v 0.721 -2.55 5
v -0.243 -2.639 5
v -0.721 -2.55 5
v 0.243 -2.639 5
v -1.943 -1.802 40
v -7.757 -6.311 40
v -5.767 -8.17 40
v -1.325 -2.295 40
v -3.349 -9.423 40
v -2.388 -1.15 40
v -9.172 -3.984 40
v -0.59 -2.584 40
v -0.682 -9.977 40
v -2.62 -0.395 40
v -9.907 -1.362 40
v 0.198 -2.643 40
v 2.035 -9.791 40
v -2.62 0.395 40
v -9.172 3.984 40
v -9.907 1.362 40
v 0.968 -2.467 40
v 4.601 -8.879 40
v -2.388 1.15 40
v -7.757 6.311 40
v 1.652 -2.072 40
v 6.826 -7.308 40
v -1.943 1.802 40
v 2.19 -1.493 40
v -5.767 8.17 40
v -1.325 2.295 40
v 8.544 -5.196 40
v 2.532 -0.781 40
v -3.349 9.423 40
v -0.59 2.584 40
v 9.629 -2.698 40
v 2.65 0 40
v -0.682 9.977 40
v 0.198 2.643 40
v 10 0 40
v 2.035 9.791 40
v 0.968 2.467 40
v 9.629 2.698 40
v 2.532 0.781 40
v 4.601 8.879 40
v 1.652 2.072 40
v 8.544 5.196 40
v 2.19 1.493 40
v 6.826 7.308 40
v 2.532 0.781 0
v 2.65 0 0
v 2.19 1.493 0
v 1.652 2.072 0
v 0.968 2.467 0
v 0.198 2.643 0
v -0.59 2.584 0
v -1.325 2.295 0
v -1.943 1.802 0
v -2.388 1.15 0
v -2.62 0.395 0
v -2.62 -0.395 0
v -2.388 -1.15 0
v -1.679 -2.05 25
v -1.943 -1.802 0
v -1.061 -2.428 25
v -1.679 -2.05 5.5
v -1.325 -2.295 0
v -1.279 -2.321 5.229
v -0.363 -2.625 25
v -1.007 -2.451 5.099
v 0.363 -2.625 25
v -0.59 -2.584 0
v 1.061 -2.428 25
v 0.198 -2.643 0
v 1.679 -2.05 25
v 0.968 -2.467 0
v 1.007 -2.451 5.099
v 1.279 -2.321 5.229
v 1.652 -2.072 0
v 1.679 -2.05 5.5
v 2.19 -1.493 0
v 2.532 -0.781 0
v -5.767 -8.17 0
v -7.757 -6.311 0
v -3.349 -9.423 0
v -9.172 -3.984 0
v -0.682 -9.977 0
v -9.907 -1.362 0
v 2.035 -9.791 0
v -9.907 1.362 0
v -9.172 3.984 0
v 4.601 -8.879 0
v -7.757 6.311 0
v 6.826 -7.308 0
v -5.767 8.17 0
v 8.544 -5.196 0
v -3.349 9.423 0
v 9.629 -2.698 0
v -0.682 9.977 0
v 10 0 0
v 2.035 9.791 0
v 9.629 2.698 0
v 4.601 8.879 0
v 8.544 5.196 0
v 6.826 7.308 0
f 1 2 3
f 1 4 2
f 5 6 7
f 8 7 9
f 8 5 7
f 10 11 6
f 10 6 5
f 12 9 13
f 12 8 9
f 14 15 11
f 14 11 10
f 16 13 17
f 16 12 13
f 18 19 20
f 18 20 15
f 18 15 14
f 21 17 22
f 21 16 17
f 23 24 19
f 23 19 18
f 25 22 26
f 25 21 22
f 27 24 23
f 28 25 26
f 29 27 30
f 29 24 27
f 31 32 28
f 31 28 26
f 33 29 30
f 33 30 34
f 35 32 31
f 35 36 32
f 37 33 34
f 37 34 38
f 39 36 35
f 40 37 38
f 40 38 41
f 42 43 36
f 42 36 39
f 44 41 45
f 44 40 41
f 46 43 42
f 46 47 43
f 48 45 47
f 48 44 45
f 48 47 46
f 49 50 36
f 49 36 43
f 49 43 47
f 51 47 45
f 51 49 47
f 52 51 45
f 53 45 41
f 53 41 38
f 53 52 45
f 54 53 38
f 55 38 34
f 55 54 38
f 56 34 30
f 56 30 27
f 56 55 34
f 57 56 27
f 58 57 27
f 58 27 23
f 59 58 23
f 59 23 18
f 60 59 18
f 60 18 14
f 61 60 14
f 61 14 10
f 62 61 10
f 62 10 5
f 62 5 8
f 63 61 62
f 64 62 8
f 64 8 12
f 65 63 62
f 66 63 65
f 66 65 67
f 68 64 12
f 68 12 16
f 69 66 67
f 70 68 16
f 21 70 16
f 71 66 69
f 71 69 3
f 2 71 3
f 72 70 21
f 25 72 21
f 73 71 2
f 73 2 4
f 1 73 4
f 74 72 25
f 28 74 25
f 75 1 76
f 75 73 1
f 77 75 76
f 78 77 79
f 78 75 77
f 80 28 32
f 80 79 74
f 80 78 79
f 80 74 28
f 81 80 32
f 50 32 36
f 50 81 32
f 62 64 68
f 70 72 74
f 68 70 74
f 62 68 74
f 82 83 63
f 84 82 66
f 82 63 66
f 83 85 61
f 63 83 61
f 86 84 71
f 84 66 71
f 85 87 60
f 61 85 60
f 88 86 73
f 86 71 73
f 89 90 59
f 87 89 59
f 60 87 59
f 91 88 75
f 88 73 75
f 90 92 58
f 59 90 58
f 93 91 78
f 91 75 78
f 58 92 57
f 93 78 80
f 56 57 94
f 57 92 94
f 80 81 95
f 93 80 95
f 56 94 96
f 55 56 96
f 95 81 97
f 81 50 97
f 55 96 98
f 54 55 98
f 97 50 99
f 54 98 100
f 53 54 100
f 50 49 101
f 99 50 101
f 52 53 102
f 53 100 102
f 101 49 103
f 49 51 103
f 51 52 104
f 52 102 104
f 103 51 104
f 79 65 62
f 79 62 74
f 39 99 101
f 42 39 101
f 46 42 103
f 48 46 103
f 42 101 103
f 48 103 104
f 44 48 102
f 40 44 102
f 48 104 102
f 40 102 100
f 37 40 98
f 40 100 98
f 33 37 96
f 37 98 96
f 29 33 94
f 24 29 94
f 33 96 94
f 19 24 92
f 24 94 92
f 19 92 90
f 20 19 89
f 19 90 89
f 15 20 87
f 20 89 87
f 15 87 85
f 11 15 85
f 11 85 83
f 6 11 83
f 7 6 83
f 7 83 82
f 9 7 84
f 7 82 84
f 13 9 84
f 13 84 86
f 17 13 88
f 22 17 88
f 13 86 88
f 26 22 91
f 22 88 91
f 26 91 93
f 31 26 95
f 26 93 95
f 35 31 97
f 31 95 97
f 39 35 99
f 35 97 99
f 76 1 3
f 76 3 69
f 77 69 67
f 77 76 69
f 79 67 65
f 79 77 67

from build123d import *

# Parameters (mm, degrees)
SKETCH002_R   = 10
SKETCH002_R_2 = 2.65
PAD002_DEPTH  = 40
PAD003_DEPTH  = 20
CHAMFER_SIZE  = 0.5


with BuildPart() as part:
    # Sketch002 → Pad002 (new body)
    with BuildSketch(Plane.XY):
        Circle(SKETCH002_R)
        Circle(SKETCH002_R_2, mode=Mode.SUBTRACT)
    extrude(amount=PAD002_DEPTH)

    # Sketch003 (on Face3 of Pad002) → Pad003 (join)
    with BuildSketch(Plane(origin=(0, 0, 5), x_dir=(1, 0, 0), z_dir=(0, 0, -1))):
        Polygon((-1.679286, 2.65), (-1.679286, 2.05), (1.679286, 2.05), (1.679286, 2.65), (0, 2.65), align=None)
    extrude(amount=-PAD003_DEPTH)

    # Chamfer
    chamfer_edges = [part.edges().sort_by_distance(p)[0] for p in [
        (0, -2.05, 5),
    ]]
    chamfer(chamfer_edges, length=CHAMFER_SIZE)


solid = part.part
